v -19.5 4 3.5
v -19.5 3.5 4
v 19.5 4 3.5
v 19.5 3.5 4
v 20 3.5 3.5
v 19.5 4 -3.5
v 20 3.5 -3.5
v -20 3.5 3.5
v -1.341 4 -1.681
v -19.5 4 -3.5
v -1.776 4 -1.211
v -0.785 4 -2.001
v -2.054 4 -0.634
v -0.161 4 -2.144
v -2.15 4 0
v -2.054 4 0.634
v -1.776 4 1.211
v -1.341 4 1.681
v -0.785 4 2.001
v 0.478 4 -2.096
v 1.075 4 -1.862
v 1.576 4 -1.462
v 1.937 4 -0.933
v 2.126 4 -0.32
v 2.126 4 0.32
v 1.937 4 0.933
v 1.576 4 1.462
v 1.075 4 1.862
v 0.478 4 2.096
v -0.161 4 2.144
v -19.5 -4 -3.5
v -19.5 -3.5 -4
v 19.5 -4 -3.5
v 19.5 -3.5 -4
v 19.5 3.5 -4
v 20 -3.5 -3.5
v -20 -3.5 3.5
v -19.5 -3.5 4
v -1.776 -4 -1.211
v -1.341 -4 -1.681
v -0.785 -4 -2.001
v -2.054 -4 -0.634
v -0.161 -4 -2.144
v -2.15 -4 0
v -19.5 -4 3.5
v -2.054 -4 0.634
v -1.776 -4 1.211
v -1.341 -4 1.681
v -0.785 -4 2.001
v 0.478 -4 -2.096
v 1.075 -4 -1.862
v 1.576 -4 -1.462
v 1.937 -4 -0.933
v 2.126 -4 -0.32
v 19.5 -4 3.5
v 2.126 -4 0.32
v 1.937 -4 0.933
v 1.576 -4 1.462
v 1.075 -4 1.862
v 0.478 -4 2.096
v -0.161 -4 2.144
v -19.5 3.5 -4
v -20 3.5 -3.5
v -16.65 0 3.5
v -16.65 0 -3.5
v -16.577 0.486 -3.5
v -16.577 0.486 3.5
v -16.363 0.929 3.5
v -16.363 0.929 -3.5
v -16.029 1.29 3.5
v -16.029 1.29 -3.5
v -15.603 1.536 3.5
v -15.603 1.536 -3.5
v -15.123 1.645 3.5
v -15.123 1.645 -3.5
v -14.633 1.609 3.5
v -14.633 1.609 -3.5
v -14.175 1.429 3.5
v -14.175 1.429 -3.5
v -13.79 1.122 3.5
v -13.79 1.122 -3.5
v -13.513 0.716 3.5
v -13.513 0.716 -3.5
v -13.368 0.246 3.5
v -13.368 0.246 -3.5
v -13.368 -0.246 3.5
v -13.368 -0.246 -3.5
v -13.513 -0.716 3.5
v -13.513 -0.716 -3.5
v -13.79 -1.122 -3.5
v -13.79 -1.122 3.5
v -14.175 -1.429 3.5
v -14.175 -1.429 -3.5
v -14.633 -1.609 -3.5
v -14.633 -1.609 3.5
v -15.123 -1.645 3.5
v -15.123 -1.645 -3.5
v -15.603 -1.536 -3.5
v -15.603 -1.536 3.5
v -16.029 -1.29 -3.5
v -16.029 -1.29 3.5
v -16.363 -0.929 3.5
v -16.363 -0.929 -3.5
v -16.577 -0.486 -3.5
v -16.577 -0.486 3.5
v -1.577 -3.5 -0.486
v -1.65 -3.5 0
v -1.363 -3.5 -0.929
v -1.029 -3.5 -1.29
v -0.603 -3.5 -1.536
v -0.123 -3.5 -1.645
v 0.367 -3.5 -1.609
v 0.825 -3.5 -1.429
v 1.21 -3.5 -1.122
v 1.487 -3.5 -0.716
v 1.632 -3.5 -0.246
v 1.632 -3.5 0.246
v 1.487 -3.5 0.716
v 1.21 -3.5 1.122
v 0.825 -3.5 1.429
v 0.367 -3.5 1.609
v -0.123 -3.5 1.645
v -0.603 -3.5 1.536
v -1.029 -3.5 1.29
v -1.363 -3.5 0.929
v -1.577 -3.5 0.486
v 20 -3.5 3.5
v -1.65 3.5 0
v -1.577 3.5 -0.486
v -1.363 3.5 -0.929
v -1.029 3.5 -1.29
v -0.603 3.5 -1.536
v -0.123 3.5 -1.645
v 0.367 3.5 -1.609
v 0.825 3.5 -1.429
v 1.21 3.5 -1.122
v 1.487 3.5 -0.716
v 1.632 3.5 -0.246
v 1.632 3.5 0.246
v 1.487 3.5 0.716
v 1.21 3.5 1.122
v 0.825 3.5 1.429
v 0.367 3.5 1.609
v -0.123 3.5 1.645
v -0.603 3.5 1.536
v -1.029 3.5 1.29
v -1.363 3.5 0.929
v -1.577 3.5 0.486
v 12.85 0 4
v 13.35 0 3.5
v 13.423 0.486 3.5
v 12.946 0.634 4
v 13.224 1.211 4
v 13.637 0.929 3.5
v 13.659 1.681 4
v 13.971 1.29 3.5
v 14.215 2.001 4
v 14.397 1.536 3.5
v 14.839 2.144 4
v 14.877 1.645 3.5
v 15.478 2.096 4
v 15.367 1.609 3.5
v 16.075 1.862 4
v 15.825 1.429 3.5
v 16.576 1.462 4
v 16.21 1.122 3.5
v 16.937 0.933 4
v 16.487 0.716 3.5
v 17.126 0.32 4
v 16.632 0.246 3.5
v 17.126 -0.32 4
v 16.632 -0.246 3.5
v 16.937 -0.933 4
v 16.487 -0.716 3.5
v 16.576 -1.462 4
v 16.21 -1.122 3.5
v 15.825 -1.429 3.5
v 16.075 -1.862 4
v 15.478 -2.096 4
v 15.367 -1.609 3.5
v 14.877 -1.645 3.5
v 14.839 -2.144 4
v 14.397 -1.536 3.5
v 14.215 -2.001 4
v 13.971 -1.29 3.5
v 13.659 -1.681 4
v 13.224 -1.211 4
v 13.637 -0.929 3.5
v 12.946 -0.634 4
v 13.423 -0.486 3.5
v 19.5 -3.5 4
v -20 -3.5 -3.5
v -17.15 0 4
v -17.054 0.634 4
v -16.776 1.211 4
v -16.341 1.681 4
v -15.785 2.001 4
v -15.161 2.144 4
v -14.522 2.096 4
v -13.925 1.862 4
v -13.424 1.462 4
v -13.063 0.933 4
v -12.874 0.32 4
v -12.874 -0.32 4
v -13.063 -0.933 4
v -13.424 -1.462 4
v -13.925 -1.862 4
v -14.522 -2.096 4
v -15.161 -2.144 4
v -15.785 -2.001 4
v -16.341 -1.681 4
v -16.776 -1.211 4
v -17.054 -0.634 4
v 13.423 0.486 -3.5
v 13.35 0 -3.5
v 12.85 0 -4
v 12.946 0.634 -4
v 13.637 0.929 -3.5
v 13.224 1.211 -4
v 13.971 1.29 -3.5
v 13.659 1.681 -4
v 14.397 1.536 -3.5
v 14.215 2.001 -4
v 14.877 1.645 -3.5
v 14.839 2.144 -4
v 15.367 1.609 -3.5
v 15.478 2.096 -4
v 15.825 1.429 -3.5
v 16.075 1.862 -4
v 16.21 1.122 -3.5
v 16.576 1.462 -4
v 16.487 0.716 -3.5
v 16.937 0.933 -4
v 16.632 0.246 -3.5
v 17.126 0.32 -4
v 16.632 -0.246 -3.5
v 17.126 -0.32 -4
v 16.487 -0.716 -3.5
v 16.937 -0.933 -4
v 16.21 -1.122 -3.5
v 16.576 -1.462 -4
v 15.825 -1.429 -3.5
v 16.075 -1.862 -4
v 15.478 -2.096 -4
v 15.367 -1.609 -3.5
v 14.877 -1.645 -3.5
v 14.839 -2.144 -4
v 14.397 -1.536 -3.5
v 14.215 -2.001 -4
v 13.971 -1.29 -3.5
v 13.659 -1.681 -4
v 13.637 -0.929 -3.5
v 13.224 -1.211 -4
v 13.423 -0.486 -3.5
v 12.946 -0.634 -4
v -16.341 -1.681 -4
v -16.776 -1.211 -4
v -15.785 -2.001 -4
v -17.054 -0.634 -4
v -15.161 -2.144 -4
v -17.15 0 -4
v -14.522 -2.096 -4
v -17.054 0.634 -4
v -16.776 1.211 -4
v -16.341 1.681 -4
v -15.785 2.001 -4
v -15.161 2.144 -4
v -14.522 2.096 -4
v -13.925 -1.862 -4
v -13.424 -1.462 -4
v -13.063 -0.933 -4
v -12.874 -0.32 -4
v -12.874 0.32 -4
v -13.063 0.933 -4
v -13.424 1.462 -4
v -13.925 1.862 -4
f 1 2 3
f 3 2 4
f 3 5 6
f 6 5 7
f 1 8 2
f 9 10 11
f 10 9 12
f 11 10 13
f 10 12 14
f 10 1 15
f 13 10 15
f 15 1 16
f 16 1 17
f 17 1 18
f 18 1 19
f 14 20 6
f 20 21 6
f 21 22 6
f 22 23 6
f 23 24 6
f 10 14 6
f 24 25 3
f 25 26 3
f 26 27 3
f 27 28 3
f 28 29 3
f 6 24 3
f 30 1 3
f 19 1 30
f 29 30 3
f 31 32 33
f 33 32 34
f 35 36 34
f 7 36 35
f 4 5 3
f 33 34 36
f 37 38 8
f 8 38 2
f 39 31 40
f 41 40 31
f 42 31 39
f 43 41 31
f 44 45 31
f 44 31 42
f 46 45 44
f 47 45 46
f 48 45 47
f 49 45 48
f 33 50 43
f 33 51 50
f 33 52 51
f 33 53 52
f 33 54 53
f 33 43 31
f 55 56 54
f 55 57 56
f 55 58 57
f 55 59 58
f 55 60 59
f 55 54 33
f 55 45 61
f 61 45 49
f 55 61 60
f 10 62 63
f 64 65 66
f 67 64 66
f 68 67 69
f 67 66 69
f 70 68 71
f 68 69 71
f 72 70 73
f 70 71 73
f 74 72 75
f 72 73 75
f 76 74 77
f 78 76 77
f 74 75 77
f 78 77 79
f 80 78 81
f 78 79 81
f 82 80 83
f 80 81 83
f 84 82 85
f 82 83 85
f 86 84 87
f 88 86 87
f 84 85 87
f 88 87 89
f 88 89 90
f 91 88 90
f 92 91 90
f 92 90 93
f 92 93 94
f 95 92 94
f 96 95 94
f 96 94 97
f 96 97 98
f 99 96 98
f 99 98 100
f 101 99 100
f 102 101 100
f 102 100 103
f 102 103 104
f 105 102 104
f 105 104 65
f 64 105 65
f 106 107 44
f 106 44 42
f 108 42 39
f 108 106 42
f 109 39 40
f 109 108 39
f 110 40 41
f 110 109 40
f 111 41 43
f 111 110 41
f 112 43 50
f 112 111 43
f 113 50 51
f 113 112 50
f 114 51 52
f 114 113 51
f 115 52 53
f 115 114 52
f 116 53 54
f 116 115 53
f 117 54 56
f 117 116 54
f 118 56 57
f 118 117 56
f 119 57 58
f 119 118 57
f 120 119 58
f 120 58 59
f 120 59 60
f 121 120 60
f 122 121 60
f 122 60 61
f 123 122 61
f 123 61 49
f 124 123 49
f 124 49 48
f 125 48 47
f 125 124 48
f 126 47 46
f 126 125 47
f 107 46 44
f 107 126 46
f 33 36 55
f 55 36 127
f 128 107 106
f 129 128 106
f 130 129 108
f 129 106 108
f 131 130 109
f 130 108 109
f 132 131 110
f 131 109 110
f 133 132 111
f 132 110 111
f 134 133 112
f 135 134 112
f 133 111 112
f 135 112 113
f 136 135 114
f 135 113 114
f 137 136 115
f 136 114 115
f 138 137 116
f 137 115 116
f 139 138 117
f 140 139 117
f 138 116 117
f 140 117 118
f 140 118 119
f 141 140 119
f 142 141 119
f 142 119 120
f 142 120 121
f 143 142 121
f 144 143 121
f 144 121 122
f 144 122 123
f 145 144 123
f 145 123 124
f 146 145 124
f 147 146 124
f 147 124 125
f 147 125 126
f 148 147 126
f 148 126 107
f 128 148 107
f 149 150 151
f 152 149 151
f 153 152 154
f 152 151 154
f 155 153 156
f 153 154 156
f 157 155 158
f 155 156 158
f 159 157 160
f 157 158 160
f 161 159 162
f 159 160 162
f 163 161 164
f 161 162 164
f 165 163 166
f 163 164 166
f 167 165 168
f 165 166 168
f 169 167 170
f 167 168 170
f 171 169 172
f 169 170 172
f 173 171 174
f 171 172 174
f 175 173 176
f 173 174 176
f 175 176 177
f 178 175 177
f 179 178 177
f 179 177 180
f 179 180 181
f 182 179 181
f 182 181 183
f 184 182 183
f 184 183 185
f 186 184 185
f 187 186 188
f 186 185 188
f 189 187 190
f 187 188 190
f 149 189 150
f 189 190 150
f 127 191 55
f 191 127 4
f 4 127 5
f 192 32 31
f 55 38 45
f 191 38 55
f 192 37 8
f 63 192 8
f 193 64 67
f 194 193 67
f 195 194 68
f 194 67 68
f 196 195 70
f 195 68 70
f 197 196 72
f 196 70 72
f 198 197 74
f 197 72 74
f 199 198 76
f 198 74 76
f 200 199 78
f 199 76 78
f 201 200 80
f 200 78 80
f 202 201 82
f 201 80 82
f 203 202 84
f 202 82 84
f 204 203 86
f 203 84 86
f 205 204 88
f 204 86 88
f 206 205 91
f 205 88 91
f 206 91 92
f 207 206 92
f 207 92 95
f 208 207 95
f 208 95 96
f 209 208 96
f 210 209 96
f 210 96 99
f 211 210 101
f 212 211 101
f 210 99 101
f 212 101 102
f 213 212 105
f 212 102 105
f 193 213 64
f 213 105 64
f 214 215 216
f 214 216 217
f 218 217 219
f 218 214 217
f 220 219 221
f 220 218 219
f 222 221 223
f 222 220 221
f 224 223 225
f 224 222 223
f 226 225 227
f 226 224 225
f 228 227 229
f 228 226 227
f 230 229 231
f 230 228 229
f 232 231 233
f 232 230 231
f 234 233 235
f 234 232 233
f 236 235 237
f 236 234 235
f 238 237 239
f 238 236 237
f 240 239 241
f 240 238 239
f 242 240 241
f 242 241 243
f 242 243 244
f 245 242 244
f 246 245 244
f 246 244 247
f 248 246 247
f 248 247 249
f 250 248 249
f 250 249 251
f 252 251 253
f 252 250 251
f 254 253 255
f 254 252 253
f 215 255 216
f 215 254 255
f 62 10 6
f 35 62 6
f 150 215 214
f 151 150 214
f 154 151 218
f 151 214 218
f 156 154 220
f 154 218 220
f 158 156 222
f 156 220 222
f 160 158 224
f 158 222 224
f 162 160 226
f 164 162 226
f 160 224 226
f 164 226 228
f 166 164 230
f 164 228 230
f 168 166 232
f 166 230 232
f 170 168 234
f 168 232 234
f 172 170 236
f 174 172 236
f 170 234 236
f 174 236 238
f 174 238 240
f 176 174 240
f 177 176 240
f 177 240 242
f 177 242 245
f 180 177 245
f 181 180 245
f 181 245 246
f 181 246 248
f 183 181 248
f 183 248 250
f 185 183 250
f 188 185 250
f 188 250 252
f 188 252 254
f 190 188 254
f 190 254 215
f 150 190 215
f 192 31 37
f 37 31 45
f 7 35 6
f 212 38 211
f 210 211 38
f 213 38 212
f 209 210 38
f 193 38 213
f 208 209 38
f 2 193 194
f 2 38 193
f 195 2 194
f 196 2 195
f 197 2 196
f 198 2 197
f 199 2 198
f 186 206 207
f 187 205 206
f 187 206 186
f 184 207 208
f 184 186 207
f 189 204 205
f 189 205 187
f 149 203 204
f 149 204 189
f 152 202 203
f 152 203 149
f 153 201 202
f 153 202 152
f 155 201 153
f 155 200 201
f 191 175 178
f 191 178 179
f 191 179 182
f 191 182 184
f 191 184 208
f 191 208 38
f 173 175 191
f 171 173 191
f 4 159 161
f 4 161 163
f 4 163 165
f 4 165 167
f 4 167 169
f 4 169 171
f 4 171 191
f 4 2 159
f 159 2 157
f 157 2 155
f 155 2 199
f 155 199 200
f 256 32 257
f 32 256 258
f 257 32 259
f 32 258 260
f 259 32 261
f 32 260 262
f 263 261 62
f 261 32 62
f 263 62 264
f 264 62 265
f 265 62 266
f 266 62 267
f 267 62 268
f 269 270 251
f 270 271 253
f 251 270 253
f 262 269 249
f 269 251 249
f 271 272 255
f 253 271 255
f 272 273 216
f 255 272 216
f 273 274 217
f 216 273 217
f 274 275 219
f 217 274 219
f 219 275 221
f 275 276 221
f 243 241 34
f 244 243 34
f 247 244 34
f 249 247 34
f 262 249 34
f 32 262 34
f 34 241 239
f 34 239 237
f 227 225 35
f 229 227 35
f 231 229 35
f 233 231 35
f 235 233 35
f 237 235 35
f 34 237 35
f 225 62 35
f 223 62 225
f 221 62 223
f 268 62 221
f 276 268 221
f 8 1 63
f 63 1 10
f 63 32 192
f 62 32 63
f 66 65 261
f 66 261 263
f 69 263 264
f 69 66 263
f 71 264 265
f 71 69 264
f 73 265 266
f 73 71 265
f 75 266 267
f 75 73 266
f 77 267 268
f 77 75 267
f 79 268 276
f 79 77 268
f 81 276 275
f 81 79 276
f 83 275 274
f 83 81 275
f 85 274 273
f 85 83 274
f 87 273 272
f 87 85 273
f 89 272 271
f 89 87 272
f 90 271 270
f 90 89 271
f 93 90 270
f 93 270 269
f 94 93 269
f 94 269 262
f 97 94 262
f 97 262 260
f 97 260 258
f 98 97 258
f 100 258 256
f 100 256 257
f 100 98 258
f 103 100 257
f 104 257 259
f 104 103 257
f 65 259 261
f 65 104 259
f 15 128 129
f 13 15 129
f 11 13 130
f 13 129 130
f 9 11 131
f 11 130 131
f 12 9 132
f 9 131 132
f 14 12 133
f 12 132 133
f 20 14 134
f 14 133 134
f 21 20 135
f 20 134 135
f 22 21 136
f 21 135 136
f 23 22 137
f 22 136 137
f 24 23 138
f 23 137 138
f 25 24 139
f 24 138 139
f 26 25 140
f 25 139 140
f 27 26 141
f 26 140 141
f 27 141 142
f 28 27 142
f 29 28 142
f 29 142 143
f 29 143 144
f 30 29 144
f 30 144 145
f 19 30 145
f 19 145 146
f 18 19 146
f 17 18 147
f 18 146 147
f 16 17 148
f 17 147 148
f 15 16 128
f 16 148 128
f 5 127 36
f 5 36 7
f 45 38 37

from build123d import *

# Parameters (mm, degrees)
SKETCH_1_W             = 40
SKETCH_1_H             = 8
EXTRUDE_1_DEPTH        = 4
HOLE_WIZARD_M4_1_D     = 3.3
HOLE_WIZARD_M4_1_DEPTH = 10.1
HOLE_WIZARD_M4_1_TIP   = 0.991420021
HOLE_WIZARD_M4_2_D     = 3.3
HOLE_WIZARD_M4_2_DEPTH = 10.1
HOLE_WIZARD_M4_2_TIP   = 0.991420021
CHAMFER_1_SIZE         = 0.5


with BuildPart() as part:
    # 草图1 → 凸台-拉伸1 (new, symmetric)
    with BuildSketch(Plane.XY):
        Rectangle(SKETCH_1_W, SKETCH_1_H)
    extrude(amount=EXTRUDE_1_DEPTH, both=True)

    # M4 螺纹孔1
    with Locations(Plane.XY.offset(4)):
        with Locations((-15, 0), (15, 0)):
            Hole(HOLE_WIZARD_M4_1_D / 2, depth=HOLE_WIZARD_M4_1_DEPTH)
            with Locations((0, 0, -(HOLE_WIZARD_M4_1_DEPTH + HOLE_WIZARD_M4_1_TIP / 2))):  # 118° drill point
                Cone(0, HOLE_WIZARD_M4_1_D / 2, HOLE_WIZARD_M4_1_TIP, mode=Mode.SUBTRACT)

    # M4 螺纹孔2
    with Locations(Plane(origin=(0, 4, 0), x_dir=(1, 0, 0), z_dir=(0, 1, 0))):
        with Locations((0, 0)):
            Hole(HOLE_WIZARD_M4_2_D / 2, depth=HOLE_WIZARD_M4_2_DEPTH)
            with Locations((0, 0, -(HOLE_WIZARD_M4_2_DEPTH + HOLE_WIZARD_M4_2_TIP / 2))):  # 118° drill point
                Cone(0, HOLE_WIZARD_M4_2_D / 2, HOLE_WIZARD_M4_2_TIP, mode=Mode.SUBTRACT)

    # 倒角1
    chamfer_1_edges = [part.edges().sort_by_distance(p)[0] for p in [
        (-20, 0, 4),
        (16.65, 0, -4),
        (16.65, 0, 4),
        (0, -4, 4),
        (-13.35, 0, -4),
        (-13.35, 0, 4),
        (1.65, -4, 0),
        (1.65, 4, 0),
        (20, 0, 4),
        (0, -4, -4),
        (-20, 0, -4),
        (0, 4, -4),
        (20, 0, -4),
        (20, -4, 0),
        (-20, -4, 0),
        (-20, 4, 0),
        (20, 4, 0),
        (0, 4, 4),
    ]]
    chamfer(chamfer_1_edges, length=CHAMFER_1_SIZE)


solid = part.part
